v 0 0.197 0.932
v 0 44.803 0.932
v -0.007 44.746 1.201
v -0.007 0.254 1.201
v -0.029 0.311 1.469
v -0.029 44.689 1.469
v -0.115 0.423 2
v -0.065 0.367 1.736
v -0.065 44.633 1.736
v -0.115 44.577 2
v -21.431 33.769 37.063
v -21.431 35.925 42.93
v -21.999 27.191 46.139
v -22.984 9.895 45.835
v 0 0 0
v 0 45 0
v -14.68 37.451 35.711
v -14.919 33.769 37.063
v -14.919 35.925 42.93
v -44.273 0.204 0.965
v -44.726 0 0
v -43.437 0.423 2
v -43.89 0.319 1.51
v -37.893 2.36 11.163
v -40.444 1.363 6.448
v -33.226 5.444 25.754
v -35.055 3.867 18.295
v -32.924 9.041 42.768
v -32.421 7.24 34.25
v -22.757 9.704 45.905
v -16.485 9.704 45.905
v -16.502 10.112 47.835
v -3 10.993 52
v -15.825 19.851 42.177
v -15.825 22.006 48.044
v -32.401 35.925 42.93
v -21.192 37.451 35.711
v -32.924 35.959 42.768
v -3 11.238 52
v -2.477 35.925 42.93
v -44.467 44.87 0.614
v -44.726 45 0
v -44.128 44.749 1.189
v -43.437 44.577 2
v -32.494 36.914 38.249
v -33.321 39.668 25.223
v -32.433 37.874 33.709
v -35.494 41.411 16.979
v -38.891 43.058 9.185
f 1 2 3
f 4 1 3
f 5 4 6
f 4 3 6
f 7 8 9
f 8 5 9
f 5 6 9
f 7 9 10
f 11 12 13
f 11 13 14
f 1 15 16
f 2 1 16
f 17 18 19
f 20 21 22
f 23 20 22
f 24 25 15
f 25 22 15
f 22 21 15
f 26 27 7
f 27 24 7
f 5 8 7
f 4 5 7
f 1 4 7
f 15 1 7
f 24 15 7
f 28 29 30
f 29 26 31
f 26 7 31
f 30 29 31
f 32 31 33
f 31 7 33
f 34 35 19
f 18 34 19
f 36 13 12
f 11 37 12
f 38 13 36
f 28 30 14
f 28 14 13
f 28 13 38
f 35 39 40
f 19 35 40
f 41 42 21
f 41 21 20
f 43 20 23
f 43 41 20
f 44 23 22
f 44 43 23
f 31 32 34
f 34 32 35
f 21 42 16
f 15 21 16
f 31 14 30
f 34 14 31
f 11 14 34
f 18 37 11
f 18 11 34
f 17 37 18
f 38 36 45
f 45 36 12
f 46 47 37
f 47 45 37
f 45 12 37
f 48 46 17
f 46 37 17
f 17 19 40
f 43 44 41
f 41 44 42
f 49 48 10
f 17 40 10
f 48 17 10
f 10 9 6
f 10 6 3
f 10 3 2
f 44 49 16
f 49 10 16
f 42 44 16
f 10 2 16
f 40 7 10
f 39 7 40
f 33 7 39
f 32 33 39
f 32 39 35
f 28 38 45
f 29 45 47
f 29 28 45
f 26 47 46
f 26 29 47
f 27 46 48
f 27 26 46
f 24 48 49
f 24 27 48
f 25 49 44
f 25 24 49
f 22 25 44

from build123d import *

# Parameters (mm, degrees)
F0_W         = 45
F0_H         = 45
F1_DEPTH     = 2
F3_DEPTH     = 45
F5_DEPTH     = 50
F7_DEPTH     = 52.4
F9_DEPTH     = 6.25
F10_T1_DEPTH = 62.3121019707
F11_T1_DEPTH = 49.4942070429


# Not quite as in the source:
# - a fillet or chamfer that OpenCascade refuses, or shapes differently, is made with other operations: its cross-section is extruded or revolved along the edge and cut away or added


with BuildPart() as f1:
    # F0 (on Top) → F1 (new body)
    with BuildSketch(Plane.XY):
        with Locations((-22.5, 22.5)):
            Rectangle(F0_W, F0_H)
    extrude(amount=F1_DEPTH)

    # F2 (on Front) → F3 (join)
    with BuildSketch(Plane.XZ):
        with BuildLine():
            Line((-45, 0), (0, 0))
            Line((0, 0), (-3, 52))
            Line((-3, 52), (-32.9244207251, 42.7682981249))
            ThreePointArc((-32.9244207251, 42.7682981249), (-34.5043559539, 20.1254790506), (-45, 0))
        make_face()
    extrude(amount=-F3_DEPTH)

    # F4 (on Right) → F5 (cut)
    with BuildSketch(Plane.YZ):
        Polygon((0, 0), (12.5, 59.1310895979), (0, 59.1310895979), align=None)
        Polygon((45, 0), (45, 59.1310895979), (32.5, 59.1310895979), align=None)
    extrude(amount=-F5_DEPTH, mode=Mode.SUBTRACT)

    # F6 (on Right) → F7 (cut)
    with BuildSketch(Plane.YZ):
        Polygon((37.7679802477, 54.4090420008), (10.9807690606, 52.094515413), (37.7679802477, 42.2525405884), align=None)
    extrude(amount=-F7_DEPTH, mode=Mode.SUBTRACT)

    # F8 (on face) → F9 (cut)
    with BuildSketch(Plane(origin=(0, 18.1697536282, 49.4531876304), x_dir=(1, 0, 0), z_dir=(0, 0.3448722583, 0.9386496287))):
        Polygon((-14.9190827221, 18.9156103945), (-13.4748989156, 42.5651032579), (-19.9628132083, 42.9612952953), (-21.4311909427, 18.9156103945), align=None)
        Polygon((-15.8245932316, 4.0872594346), (-14.9190827221, 18.9156103945), (-21.4311909427, 18.9156103945), (-21.9993973802, 9.6108432114), align=None)
        Polygon((-17.0844251269, -16.5433453977), (-15.8245932316, 4.0872594346), (-21.9993973802, 9.6108432114), (-23.5723394196, -16.1471533603), align=None)
    extrude(amount=-F9_DEPTH, mode=Mode.SUBTRACT)

    # F10: fillet of radius 5 on 1 edges, made by hand

    # F10_s2 → F10_t1 (cut)
    with BuildSketch(Plane.XZ.offset(-53.6560509853)):
        with BuildLine():
            ThreePointArc((-45, -1.6315361684), (-44.5926166392, 0.3452977662), (-43.436851038, 2))
            Line((-43.436851038, 2), (-45, 2))
            Line((-45, 2), (-45, -1.6315361684))
        make_face()
    extrude(amount=F10_T1_DEPTH, mode=Mode.SUBTRACT)

    # F11: fillet of radius 5 on 1 edges, made by hand

    # F11_s2 → F11_t1 (cut)
    with BuildSketch(Plane.XZ.offset(-47.2471035215)):
        with BuildLine():
            ThreePointArc((0, 0.9320428172), (-0.0289298475, 1.4691289727), (-0.1153846154, 2))
            Line((-0.1153846154, 2), (0, 2))
            Line((0, 2), (0, 0.9320428172))
        make_face()
    extrude(amount=F11_T1_DEPTH, mode=Mode.SUBTRACT)


solid = f1.part
